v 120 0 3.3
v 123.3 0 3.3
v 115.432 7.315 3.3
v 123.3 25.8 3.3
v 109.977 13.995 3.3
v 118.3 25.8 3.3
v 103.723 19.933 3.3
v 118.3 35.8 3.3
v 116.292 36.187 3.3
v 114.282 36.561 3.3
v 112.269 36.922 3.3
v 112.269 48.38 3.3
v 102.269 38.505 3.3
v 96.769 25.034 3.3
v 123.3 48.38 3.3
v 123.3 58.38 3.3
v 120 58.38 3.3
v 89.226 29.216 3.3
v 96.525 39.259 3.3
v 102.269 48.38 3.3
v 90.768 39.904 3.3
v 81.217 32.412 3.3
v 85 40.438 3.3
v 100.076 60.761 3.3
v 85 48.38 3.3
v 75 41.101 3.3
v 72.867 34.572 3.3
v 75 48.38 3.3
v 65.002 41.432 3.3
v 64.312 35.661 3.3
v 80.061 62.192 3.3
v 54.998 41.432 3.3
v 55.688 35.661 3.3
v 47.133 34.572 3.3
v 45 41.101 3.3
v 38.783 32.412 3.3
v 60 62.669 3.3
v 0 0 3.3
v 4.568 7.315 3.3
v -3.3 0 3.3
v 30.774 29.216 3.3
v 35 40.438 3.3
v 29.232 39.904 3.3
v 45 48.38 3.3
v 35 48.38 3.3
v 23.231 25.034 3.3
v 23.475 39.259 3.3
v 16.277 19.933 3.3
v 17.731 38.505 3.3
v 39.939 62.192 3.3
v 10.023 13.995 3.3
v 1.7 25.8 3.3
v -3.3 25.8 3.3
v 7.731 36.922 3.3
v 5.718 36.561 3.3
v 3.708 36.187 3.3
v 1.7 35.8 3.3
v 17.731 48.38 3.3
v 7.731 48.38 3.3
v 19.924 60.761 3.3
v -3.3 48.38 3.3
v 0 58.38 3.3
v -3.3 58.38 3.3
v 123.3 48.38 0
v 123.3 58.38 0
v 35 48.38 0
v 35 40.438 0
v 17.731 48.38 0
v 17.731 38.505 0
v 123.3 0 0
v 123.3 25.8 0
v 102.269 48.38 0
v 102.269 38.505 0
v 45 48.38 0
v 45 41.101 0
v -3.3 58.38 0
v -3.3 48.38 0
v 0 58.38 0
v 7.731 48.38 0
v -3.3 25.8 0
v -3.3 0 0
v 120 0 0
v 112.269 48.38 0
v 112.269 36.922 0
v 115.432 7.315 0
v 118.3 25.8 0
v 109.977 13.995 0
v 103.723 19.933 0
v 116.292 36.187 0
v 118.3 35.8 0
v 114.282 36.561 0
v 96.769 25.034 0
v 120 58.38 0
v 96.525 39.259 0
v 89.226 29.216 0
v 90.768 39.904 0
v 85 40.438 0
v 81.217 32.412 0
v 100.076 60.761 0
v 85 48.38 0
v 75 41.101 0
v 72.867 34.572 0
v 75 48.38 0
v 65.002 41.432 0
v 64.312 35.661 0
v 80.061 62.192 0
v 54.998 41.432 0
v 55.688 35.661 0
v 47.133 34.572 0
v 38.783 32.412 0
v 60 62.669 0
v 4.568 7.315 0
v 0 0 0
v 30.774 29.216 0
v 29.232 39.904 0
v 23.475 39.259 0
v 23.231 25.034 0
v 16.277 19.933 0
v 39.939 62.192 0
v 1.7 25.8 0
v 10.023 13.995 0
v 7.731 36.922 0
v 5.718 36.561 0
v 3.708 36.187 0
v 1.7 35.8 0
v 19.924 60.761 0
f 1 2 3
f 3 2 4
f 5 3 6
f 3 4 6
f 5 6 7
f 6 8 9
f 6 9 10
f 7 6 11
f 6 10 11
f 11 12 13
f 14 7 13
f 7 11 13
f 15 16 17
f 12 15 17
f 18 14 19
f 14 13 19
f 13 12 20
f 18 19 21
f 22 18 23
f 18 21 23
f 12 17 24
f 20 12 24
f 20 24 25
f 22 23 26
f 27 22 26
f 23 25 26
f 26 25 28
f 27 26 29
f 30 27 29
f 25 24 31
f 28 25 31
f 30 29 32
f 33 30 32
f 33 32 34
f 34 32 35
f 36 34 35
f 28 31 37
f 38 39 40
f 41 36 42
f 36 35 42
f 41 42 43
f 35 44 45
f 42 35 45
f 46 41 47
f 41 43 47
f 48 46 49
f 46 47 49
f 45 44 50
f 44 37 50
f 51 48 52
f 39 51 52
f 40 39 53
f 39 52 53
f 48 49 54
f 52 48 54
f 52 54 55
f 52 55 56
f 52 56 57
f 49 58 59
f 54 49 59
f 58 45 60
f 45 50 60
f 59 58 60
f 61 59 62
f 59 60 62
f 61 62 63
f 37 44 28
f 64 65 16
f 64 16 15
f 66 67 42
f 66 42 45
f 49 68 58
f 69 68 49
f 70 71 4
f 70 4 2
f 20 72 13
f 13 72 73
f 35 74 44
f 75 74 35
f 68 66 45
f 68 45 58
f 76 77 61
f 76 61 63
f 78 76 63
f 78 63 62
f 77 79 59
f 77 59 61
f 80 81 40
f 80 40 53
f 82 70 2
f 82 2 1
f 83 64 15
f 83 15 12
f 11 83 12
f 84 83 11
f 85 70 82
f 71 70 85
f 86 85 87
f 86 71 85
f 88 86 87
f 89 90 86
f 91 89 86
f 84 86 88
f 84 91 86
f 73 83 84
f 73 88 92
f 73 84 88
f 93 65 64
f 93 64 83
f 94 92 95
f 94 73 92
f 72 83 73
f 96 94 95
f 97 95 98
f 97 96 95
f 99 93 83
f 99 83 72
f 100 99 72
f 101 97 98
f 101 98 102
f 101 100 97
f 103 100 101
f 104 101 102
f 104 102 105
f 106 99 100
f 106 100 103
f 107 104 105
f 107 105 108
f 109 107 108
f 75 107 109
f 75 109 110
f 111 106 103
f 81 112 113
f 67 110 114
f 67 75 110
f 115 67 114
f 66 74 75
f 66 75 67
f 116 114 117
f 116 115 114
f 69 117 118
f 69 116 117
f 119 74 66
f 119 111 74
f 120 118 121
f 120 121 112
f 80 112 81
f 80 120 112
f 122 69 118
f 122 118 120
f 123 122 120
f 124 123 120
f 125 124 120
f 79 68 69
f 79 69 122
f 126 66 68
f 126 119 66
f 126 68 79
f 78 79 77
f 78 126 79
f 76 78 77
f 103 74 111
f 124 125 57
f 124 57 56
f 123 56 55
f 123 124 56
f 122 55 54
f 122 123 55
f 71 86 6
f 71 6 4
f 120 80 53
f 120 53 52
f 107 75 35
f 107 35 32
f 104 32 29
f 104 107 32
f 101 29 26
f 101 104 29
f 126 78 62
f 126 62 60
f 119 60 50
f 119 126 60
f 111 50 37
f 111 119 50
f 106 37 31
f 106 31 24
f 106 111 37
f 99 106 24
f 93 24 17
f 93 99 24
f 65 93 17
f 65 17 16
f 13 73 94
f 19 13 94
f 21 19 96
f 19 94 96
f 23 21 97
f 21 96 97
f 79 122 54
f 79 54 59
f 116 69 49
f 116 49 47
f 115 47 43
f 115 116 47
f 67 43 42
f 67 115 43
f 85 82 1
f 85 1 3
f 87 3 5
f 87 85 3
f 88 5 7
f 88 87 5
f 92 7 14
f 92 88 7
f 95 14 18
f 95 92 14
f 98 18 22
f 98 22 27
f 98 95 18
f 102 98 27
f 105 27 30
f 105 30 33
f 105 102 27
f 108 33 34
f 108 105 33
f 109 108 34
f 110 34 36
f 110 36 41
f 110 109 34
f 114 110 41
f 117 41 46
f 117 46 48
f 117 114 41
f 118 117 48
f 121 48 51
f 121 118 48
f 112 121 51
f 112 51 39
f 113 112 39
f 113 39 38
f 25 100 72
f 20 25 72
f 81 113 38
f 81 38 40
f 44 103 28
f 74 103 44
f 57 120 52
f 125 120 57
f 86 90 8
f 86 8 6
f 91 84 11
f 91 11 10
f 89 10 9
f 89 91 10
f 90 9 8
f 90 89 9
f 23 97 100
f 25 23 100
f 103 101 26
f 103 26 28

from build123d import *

# Parameters (mm, degrees)
SALIENTE_EXTRUIR1_DEPTH = 3.3


with BuildPart() as part:
    # Croquis1 → Saliente-Extruir1 (new body)
    with BuildSketch(Plane.XY):
        with BuildLine():
            Line((1.7, 25.8), (1.7, 35.8))
            ThreePointArc((1.7, 35.8), (4.712607831, 36.376098873), (7.730904305, 36.921609869))
            Line((7.730904305, 36.921609869), (7.730904305, 48.38))
            Line((7.730904305, 48.38), (1.7, 48.38))
            Line((1.7, 48.38), (-3.3, 48.38))
            Line((-3.3, 48.38), (-3.3, 58.38))
            Line((-3.3, 58.38), (0, 58.38))
            ThreePointArc((0, 58.38), (60, 62.669337163), (120, 58.38))
            Line((120, 58.38), (123.3, 58.38))
            Line((123.3, 58.38), (123.3, 48.38))
            Line((123.3, 48.38), (118.3, 48.38))
            Line((118.3, 48.38), (112.269095695, 48.38))
            Line((112.269095695, 48.38), (112.269095695, 36.921609869))
            ThreePointArc((112.269095695, 36.921609869), (115.287392169, 36.376098873), (118.3, 35.8))
            Line((118.3, 35.8), (118.3, 25.8))
            Line((118.3, 25.8), (123.3, 25.8))
            Line((123.3, 25.8), (123.3, 0))
            Line((123.3, 0), (120, 0))
            ThreePointArc((120, 0), (60, 35.797503597), (0, 0))
            Line((0, 0), (-3.3, 0))
            Line((-3.3, 0), (-3.3, 25.8))
            Line((-3.3, 25.8), (1.7, 25.8))
        make_face()
        with BuildLine():
            Line((17.730904305, 48.38), (17.730904305, 38.504540112))
            ThreePointArc((17.730904305, 38.504540112), (26.351558557, 39.595469902), (35, 40.438243974))
            Line((35, 40.438243974), (35, 48.38))
            Line((35, 48.38), (17.730904305, 48.38))
        make_face(mode=Mode.SUBTRACT)
        with BuildLine():
            Line((45, 48.38), (45, 41.101210552))
            ThreePointArc((45, 41.101210552), (60, 41.473490482), (75, 41.101210552))
            Line((75, 41.101210552), (75, 48.38))
            Line((75, 48.38), (45, 48.38))
        make_face(mode=Mode.SUBTRACT)
        with BuildLine():
            Line((85, 40.438243974), (85, 48.38))
            Line((85, 48.38), (102.269095695, 48.38))
            Line((102.269095695, 48.38), (102.269095695, 38.504540112))
            ThreePointArc((102.269095695, 38.504540112), (93.648441443, 39.595469902), (85, 40.438243974))
        make_face(mode=Mode.SUBTRACT)
    extrude(amount=SALIENTE_EXTRUIR1_DEPTH)


solid = part.part
